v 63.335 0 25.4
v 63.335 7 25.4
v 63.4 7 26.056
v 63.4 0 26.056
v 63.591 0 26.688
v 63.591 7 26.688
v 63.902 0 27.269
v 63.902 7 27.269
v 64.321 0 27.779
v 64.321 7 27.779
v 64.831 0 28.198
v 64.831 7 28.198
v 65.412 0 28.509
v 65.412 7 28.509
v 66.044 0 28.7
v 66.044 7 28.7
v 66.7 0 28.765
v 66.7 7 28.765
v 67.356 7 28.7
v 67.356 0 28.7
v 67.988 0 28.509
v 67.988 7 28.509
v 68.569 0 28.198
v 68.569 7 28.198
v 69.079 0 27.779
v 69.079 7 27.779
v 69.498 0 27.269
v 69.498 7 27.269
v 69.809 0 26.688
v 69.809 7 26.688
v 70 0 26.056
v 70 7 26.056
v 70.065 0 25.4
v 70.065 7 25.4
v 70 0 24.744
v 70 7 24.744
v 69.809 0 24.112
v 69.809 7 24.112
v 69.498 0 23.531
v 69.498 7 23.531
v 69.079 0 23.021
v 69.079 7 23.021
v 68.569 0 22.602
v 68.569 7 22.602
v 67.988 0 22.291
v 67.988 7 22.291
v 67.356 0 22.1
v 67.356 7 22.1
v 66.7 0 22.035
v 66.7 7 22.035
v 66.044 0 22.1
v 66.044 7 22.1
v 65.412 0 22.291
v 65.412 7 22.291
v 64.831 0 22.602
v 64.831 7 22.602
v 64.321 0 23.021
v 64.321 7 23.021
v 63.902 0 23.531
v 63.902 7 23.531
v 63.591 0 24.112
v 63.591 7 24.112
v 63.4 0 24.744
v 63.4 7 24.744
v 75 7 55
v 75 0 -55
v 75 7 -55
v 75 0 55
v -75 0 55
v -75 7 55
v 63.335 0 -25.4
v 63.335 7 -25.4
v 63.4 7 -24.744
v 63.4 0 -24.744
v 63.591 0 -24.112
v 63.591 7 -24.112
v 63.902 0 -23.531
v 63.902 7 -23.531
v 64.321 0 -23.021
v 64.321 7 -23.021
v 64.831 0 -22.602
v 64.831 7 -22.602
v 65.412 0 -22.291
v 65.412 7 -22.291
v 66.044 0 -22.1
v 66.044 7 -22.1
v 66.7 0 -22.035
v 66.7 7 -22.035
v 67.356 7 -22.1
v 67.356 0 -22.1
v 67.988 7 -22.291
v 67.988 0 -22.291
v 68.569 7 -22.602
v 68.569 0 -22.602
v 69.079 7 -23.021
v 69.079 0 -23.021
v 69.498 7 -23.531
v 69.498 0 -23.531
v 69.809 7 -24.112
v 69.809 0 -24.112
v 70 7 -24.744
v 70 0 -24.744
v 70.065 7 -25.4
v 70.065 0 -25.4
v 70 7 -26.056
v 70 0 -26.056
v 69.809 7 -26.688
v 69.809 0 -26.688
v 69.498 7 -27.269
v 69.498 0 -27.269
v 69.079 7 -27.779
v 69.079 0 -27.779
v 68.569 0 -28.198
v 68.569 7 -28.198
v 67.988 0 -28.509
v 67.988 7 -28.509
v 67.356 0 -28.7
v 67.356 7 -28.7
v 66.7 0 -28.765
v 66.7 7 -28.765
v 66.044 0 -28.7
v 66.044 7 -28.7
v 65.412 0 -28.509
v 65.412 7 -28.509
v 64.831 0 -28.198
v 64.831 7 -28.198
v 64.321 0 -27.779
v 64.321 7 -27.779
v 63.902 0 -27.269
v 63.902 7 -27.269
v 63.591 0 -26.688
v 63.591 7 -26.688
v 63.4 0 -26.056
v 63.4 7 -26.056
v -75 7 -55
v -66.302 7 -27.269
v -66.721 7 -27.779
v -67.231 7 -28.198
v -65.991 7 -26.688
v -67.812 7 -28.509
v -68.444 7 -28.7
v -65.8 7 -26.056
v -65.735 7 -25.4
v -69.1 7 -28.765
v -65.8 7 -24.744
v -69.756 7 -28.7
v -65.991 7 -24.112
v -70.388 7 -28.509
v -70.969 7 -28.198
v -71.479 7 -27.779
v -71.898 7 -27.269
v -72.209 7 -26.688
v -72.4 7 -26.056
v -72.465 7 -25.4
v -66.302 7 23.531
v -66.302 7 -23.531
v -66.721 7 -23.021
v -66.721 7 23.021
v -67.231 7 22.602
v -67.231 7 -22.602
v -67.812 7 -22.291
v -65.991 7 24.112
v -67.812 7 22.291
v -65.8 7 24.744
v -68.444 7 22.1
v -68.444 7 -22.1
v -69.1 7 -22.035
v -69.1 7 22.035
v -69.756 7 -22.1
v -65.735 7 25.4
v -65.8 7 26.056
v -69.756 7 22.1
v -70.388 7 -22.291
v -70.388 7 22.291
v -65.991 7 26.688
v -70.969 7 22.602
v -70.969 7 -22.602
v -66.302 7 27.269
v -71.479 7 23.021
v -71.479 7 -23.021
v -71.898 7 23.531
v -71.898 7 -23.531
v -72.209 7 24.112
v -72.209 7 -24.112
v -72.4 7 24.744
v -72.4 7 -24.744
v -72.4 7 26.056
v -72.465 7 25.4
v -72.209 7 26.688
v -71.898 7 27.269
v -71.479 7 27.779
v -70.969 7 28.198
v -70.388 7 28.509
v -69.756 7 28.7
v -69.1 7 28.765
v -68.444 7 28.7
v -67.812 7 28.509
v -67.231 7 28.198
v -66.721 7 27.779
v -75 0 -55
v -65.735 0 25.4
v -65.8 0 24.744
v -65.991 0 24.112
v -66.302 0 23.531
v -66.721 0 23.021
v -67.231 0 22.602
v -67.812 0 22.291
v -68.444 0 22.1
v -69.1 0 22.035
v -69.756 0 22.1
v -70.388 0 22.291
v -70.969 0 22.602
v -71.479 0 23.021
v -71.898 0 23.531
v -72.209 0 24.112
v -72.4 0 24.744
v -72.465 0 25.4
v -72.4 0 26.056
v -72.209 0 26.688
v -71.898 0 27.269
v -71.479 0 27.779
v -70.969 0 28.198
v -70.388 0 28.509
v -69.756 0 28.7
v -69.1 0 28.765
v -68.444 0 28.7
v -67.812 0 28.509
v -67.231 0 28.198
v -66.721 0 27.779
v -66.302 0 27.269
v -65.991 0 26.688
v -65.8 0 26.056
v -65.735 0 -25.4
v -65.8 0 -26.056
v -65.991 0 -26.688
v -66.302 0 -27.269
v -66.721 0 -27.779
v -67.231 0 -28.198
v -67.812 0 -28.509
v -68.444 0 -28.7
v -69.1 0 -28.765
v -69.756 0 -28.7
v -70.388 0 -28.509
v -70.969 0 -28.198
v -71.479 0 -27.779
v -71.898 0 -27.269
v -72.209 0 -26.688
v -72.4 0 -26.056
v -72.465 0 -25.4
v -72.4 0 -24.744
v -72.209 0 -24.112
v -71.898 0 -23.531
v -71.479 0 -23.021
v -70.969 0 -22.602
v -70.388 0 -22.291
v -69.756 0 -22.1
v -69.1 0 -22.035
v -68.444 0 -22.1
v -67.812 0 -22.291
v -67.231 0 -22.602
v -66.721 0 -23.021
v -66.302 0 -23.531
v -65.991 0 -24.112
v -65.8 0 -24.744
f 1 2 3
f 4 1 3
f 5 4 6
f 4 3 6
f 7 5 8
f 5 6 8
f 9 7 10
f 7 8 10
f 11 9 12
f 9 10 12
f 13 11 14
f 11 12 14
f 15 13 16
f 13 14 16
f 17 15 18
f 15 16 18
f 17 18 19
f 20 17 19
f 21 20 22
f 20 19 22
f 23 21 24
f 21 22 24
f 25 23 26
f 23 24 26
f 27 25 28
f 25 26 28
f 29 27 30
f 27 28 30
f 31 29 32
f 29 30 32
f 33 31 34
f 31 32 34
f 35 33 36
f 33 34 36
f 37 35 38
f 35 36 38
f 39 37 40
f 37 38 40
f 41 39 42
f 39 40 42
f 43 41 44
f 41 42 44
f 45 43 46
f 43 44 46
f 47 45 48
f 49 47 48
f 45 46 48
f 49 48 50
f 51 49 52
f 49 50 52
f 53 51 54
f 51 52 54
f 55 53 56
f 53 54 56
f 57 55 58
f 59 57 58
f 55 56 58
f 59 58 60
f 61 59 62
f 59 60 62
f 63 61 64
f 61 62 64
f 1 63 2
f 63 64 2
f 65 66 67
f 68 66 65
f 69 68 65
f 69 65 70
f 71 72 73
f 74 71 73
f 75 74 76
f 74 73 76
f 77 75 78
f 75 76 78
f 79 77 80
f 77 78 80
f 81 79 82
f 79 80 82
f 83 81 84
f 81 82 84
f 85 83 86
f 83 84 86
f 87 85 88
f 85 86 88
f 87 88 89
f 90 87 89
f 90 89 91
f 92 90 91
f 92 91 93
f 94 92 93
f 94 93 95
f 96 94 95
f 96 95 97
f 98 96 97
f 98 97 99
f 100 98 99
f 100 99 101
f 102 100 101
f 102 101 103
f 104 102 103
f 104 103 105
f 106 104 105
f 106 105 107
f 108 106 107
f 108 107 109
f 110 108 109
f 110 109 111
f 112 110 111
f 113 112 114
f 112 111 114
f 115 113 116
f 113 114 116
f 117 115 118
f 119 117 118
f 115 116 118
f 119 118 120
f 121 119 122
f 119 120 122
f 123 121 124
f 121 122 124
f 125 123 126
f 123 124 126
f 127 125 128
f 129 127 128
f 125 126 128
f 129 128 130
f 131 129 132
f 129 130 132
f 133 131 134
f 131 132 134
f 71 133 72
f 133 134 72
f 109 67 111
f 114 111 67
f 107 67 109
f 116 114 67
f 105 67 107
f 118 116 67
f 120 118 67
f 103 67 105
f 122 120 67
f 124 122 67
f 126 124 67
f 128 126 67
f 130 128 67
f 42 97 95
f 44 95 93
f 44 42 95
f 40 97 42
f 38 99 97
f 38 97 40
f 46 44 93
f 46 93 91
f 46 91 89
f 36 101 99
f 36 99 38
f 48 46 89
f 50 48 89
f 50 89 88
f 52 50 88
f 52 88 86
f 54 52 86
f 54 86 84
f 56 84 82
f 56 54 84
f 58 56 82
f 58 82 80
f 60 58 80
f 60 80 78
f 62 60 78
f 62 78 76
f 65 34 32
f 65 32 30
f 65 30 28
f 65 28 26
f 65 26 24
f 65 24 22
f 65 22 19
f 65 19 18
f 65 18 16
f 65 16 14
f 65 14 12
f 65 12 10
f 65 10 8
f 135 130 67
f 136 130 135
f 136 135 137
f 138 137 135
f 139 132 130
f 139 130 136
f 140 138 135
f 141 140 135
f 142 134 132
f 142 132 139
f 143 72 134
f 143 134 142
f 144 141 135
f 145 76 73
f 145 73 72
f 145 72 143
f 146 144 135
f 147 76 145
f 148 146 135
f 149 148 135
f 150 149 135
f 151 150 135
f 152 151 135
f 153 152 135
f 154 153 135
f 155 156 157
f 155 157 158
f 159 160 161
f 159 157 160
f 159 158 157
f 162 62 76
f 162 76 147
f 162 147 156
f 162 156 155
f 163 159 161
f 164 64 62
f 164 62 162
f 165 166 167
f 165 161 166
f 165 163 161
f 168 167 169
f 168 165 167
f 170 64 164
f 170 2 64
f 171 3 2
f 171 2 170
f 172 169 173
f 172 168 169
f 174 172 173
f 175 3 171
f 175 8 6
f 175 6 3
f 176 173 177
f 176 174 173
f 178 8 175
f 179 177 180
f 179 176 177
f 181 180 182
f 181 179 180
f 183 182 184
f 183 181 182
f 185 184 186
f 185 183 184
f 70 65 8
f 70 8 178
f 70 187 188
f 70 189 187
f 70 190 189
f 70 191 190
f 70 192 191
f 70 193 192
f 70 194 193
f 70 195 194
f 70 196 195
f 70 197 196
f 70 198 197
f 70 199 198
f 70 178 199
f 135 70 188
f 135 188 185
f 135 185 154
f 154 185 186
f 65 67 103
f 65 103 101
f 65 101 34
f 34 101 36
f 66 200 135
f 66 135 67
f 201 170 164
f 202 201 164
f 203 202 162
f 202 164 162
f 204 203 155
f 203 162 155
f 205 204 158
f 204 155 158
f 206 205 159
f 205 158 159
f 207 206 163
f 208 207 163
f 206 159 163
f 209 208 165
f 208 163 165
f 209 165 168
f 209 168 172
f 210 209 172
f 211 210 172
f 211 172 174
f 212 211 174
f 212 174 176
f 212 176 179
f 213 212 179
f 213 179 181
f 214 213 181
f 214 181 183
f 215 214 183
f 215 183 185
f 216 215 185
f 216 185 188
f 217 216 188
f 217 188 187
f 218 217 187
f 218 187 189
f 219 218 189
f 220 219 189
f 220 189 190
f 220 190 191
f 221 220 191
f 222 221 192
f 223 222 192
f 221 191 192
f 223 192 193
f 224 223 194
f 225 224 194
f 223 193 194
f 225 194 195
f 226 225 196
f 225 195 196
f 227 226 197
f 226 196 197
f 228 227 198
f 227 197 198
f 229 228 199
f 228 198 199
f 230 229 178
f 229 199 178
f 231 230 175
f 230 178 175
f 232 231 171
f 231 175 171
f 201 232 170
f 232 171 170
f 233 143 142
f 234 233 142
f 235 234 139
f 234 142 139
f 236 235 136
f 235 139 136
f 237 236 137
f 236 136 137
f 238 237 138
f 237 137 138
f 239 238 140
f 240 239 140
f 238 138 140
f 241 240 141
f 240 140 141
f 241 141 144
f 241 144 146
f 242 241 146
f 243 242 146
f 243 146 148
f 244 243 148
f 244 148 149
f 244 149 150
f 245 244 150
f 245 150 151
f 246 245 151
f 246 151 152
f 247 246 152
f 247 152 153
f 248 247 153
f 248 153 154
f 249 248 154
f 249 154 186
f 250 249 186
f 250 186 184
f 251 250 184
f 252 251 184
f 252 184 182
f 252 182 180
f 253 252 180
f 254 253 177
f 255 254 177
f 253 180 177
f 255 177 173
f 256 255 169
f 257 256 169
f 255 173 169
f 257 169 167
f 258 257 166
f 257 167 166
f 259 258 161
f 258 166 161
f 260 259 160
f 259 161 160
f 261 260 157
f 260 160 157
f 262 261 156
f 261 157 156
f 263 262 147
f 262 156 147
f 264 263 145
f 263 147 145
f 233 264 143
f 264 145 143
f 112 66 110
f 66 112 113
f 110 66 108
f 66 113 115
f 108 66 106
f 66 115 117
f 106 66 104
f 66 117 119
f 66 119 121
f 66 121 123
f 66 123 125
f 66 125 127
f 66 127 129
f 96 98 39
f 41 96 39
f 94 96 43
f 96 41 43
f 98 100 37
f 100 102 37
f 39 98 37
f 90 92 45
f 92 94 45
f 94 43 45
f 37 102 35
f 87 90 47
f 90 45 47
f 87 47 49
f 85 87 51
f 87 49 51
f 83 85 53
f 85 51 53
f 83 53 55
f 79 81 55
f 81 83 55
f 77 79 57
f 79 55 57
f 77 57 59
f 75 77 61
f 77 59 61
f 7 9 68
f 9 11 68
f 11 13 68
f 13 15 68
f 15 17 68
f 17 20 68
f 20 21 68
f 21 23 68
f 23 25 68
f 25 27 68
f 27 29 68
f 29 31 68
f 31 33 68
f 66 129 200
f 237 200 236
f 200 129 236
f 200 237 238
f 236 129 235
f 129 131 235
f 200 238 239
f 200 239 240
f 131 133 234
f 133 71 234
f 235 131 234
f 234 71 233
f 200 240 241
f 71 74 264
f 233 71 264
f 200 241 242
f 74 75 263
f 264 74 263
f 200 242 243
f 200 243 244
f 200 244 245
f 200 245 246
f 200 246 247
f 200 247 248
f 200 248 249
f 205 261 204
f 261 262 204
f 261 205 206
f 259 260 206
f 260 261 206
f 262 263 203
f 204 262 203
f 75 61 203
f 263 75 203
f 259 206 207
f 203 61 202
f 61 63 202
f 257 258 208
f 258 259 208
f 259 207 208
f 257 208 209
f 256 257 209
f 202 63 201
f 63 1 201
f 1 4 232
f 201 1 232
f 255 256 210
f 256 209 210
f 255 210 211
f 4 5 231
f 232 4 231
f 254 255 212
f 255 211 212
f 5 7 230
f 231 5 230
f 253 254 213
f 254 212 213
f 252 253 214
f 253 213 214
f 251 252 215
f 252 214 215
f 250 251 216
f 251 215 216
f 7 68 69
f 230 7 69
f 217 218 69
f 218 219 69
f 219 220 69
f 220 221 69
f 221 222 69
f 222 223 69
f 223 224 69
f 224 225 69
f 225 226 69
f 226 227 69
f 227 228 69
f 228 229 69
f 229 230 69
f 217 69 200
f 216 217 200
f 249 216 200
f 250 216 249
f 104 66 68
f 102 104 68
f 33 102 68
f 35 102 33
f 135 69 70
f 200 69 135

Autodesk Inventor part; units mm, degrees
ref_plane "YZ Plane" through (0, 0, 0) normal (1, 0, 0) x (0, 1, 0)
ref_plane "XZ Plane" through (0, 0, 0) normal (0, 1, 0) x (-1, 0, 0)
ref_plane "XY Plane" through (0, 0, 0) normal (0, 0, 1) x (1, 0, 0)
sketch "Sketch1" plane through (0, 0, 0) normal (0, 1, 0) x (-1, 0, 0)
  line L0 (-75, 55) -> (75, 55)
  line L1 (75, 55) -> (75, -55)
  line L2 (75, -55) -> (-75, -55)
  line L3 (-75, -55) -> (-75, 55)
  line L4 (-75, 55) -> (75, -55) construction
  line L5 (75, 55) -> (-75, -55) construction
  point P0 (0, 0)
  dimension "d0" = 150
  dimension "d1" = 110
extrude "Extrusion1" add sketch "Sketch1" along normal blind 7
sketch "Sketch9" plane through (0, 7, 0) normal (0, 1, 0) x (1, 0, 0)
  line L0 (-75, 55) -> (-75, -55) construction
  line L1 (-75, -55) -> (75, -55) construction
  line L2 (-62, 57.15) -> (-62, -57.15) construction
  line L3 (75, 55) -> (-75, 55) construction
  line L4 (75, 55) -> (-75, 55) construction
  line L5 (75, -55) -> (75, 55) construction
  line L6 (62, -57.15) -> (62, 57.15) construction
  line L7 (-75, -55) -> (75, -55) construction
  line L8 (-75, -57.15) -> (-62, -57.15) construction
  line L9 (-69.1, 0) -> (-69.1, -25.4) construction
  line L10 (-69.1, 0) -> (-69.1, 25.4) construction
  circle A0 centre (-69.1, 25.4) radius 3.365
  circle A1 centre (-69.1, -25.4) radius 3.365
  point P0 (0, 0)
  point P1 (54, 57.15)
  point P2 (54, -57.15)
  point P3 (-54, -57.15)
  point P4 (-54, 57.15)
  dimension "d36" = 25.4
  dimension "d37" = 25.4
  dimension "d38" = 6.73
  dimension "d39" = 6.73
extrude "Extrusion9" cut sketch "Sketch9" against normal blind 10
ref_plane "Work Plane2" through (-1.2, 0, 55) normal (1, 0, 0) x (0, 0, -1)
mirror "Mirror2" about plane through (-1.2, 0, 55) normal (1, 0, 0) of "Extrusion9"
properties part number "cooling plate"
